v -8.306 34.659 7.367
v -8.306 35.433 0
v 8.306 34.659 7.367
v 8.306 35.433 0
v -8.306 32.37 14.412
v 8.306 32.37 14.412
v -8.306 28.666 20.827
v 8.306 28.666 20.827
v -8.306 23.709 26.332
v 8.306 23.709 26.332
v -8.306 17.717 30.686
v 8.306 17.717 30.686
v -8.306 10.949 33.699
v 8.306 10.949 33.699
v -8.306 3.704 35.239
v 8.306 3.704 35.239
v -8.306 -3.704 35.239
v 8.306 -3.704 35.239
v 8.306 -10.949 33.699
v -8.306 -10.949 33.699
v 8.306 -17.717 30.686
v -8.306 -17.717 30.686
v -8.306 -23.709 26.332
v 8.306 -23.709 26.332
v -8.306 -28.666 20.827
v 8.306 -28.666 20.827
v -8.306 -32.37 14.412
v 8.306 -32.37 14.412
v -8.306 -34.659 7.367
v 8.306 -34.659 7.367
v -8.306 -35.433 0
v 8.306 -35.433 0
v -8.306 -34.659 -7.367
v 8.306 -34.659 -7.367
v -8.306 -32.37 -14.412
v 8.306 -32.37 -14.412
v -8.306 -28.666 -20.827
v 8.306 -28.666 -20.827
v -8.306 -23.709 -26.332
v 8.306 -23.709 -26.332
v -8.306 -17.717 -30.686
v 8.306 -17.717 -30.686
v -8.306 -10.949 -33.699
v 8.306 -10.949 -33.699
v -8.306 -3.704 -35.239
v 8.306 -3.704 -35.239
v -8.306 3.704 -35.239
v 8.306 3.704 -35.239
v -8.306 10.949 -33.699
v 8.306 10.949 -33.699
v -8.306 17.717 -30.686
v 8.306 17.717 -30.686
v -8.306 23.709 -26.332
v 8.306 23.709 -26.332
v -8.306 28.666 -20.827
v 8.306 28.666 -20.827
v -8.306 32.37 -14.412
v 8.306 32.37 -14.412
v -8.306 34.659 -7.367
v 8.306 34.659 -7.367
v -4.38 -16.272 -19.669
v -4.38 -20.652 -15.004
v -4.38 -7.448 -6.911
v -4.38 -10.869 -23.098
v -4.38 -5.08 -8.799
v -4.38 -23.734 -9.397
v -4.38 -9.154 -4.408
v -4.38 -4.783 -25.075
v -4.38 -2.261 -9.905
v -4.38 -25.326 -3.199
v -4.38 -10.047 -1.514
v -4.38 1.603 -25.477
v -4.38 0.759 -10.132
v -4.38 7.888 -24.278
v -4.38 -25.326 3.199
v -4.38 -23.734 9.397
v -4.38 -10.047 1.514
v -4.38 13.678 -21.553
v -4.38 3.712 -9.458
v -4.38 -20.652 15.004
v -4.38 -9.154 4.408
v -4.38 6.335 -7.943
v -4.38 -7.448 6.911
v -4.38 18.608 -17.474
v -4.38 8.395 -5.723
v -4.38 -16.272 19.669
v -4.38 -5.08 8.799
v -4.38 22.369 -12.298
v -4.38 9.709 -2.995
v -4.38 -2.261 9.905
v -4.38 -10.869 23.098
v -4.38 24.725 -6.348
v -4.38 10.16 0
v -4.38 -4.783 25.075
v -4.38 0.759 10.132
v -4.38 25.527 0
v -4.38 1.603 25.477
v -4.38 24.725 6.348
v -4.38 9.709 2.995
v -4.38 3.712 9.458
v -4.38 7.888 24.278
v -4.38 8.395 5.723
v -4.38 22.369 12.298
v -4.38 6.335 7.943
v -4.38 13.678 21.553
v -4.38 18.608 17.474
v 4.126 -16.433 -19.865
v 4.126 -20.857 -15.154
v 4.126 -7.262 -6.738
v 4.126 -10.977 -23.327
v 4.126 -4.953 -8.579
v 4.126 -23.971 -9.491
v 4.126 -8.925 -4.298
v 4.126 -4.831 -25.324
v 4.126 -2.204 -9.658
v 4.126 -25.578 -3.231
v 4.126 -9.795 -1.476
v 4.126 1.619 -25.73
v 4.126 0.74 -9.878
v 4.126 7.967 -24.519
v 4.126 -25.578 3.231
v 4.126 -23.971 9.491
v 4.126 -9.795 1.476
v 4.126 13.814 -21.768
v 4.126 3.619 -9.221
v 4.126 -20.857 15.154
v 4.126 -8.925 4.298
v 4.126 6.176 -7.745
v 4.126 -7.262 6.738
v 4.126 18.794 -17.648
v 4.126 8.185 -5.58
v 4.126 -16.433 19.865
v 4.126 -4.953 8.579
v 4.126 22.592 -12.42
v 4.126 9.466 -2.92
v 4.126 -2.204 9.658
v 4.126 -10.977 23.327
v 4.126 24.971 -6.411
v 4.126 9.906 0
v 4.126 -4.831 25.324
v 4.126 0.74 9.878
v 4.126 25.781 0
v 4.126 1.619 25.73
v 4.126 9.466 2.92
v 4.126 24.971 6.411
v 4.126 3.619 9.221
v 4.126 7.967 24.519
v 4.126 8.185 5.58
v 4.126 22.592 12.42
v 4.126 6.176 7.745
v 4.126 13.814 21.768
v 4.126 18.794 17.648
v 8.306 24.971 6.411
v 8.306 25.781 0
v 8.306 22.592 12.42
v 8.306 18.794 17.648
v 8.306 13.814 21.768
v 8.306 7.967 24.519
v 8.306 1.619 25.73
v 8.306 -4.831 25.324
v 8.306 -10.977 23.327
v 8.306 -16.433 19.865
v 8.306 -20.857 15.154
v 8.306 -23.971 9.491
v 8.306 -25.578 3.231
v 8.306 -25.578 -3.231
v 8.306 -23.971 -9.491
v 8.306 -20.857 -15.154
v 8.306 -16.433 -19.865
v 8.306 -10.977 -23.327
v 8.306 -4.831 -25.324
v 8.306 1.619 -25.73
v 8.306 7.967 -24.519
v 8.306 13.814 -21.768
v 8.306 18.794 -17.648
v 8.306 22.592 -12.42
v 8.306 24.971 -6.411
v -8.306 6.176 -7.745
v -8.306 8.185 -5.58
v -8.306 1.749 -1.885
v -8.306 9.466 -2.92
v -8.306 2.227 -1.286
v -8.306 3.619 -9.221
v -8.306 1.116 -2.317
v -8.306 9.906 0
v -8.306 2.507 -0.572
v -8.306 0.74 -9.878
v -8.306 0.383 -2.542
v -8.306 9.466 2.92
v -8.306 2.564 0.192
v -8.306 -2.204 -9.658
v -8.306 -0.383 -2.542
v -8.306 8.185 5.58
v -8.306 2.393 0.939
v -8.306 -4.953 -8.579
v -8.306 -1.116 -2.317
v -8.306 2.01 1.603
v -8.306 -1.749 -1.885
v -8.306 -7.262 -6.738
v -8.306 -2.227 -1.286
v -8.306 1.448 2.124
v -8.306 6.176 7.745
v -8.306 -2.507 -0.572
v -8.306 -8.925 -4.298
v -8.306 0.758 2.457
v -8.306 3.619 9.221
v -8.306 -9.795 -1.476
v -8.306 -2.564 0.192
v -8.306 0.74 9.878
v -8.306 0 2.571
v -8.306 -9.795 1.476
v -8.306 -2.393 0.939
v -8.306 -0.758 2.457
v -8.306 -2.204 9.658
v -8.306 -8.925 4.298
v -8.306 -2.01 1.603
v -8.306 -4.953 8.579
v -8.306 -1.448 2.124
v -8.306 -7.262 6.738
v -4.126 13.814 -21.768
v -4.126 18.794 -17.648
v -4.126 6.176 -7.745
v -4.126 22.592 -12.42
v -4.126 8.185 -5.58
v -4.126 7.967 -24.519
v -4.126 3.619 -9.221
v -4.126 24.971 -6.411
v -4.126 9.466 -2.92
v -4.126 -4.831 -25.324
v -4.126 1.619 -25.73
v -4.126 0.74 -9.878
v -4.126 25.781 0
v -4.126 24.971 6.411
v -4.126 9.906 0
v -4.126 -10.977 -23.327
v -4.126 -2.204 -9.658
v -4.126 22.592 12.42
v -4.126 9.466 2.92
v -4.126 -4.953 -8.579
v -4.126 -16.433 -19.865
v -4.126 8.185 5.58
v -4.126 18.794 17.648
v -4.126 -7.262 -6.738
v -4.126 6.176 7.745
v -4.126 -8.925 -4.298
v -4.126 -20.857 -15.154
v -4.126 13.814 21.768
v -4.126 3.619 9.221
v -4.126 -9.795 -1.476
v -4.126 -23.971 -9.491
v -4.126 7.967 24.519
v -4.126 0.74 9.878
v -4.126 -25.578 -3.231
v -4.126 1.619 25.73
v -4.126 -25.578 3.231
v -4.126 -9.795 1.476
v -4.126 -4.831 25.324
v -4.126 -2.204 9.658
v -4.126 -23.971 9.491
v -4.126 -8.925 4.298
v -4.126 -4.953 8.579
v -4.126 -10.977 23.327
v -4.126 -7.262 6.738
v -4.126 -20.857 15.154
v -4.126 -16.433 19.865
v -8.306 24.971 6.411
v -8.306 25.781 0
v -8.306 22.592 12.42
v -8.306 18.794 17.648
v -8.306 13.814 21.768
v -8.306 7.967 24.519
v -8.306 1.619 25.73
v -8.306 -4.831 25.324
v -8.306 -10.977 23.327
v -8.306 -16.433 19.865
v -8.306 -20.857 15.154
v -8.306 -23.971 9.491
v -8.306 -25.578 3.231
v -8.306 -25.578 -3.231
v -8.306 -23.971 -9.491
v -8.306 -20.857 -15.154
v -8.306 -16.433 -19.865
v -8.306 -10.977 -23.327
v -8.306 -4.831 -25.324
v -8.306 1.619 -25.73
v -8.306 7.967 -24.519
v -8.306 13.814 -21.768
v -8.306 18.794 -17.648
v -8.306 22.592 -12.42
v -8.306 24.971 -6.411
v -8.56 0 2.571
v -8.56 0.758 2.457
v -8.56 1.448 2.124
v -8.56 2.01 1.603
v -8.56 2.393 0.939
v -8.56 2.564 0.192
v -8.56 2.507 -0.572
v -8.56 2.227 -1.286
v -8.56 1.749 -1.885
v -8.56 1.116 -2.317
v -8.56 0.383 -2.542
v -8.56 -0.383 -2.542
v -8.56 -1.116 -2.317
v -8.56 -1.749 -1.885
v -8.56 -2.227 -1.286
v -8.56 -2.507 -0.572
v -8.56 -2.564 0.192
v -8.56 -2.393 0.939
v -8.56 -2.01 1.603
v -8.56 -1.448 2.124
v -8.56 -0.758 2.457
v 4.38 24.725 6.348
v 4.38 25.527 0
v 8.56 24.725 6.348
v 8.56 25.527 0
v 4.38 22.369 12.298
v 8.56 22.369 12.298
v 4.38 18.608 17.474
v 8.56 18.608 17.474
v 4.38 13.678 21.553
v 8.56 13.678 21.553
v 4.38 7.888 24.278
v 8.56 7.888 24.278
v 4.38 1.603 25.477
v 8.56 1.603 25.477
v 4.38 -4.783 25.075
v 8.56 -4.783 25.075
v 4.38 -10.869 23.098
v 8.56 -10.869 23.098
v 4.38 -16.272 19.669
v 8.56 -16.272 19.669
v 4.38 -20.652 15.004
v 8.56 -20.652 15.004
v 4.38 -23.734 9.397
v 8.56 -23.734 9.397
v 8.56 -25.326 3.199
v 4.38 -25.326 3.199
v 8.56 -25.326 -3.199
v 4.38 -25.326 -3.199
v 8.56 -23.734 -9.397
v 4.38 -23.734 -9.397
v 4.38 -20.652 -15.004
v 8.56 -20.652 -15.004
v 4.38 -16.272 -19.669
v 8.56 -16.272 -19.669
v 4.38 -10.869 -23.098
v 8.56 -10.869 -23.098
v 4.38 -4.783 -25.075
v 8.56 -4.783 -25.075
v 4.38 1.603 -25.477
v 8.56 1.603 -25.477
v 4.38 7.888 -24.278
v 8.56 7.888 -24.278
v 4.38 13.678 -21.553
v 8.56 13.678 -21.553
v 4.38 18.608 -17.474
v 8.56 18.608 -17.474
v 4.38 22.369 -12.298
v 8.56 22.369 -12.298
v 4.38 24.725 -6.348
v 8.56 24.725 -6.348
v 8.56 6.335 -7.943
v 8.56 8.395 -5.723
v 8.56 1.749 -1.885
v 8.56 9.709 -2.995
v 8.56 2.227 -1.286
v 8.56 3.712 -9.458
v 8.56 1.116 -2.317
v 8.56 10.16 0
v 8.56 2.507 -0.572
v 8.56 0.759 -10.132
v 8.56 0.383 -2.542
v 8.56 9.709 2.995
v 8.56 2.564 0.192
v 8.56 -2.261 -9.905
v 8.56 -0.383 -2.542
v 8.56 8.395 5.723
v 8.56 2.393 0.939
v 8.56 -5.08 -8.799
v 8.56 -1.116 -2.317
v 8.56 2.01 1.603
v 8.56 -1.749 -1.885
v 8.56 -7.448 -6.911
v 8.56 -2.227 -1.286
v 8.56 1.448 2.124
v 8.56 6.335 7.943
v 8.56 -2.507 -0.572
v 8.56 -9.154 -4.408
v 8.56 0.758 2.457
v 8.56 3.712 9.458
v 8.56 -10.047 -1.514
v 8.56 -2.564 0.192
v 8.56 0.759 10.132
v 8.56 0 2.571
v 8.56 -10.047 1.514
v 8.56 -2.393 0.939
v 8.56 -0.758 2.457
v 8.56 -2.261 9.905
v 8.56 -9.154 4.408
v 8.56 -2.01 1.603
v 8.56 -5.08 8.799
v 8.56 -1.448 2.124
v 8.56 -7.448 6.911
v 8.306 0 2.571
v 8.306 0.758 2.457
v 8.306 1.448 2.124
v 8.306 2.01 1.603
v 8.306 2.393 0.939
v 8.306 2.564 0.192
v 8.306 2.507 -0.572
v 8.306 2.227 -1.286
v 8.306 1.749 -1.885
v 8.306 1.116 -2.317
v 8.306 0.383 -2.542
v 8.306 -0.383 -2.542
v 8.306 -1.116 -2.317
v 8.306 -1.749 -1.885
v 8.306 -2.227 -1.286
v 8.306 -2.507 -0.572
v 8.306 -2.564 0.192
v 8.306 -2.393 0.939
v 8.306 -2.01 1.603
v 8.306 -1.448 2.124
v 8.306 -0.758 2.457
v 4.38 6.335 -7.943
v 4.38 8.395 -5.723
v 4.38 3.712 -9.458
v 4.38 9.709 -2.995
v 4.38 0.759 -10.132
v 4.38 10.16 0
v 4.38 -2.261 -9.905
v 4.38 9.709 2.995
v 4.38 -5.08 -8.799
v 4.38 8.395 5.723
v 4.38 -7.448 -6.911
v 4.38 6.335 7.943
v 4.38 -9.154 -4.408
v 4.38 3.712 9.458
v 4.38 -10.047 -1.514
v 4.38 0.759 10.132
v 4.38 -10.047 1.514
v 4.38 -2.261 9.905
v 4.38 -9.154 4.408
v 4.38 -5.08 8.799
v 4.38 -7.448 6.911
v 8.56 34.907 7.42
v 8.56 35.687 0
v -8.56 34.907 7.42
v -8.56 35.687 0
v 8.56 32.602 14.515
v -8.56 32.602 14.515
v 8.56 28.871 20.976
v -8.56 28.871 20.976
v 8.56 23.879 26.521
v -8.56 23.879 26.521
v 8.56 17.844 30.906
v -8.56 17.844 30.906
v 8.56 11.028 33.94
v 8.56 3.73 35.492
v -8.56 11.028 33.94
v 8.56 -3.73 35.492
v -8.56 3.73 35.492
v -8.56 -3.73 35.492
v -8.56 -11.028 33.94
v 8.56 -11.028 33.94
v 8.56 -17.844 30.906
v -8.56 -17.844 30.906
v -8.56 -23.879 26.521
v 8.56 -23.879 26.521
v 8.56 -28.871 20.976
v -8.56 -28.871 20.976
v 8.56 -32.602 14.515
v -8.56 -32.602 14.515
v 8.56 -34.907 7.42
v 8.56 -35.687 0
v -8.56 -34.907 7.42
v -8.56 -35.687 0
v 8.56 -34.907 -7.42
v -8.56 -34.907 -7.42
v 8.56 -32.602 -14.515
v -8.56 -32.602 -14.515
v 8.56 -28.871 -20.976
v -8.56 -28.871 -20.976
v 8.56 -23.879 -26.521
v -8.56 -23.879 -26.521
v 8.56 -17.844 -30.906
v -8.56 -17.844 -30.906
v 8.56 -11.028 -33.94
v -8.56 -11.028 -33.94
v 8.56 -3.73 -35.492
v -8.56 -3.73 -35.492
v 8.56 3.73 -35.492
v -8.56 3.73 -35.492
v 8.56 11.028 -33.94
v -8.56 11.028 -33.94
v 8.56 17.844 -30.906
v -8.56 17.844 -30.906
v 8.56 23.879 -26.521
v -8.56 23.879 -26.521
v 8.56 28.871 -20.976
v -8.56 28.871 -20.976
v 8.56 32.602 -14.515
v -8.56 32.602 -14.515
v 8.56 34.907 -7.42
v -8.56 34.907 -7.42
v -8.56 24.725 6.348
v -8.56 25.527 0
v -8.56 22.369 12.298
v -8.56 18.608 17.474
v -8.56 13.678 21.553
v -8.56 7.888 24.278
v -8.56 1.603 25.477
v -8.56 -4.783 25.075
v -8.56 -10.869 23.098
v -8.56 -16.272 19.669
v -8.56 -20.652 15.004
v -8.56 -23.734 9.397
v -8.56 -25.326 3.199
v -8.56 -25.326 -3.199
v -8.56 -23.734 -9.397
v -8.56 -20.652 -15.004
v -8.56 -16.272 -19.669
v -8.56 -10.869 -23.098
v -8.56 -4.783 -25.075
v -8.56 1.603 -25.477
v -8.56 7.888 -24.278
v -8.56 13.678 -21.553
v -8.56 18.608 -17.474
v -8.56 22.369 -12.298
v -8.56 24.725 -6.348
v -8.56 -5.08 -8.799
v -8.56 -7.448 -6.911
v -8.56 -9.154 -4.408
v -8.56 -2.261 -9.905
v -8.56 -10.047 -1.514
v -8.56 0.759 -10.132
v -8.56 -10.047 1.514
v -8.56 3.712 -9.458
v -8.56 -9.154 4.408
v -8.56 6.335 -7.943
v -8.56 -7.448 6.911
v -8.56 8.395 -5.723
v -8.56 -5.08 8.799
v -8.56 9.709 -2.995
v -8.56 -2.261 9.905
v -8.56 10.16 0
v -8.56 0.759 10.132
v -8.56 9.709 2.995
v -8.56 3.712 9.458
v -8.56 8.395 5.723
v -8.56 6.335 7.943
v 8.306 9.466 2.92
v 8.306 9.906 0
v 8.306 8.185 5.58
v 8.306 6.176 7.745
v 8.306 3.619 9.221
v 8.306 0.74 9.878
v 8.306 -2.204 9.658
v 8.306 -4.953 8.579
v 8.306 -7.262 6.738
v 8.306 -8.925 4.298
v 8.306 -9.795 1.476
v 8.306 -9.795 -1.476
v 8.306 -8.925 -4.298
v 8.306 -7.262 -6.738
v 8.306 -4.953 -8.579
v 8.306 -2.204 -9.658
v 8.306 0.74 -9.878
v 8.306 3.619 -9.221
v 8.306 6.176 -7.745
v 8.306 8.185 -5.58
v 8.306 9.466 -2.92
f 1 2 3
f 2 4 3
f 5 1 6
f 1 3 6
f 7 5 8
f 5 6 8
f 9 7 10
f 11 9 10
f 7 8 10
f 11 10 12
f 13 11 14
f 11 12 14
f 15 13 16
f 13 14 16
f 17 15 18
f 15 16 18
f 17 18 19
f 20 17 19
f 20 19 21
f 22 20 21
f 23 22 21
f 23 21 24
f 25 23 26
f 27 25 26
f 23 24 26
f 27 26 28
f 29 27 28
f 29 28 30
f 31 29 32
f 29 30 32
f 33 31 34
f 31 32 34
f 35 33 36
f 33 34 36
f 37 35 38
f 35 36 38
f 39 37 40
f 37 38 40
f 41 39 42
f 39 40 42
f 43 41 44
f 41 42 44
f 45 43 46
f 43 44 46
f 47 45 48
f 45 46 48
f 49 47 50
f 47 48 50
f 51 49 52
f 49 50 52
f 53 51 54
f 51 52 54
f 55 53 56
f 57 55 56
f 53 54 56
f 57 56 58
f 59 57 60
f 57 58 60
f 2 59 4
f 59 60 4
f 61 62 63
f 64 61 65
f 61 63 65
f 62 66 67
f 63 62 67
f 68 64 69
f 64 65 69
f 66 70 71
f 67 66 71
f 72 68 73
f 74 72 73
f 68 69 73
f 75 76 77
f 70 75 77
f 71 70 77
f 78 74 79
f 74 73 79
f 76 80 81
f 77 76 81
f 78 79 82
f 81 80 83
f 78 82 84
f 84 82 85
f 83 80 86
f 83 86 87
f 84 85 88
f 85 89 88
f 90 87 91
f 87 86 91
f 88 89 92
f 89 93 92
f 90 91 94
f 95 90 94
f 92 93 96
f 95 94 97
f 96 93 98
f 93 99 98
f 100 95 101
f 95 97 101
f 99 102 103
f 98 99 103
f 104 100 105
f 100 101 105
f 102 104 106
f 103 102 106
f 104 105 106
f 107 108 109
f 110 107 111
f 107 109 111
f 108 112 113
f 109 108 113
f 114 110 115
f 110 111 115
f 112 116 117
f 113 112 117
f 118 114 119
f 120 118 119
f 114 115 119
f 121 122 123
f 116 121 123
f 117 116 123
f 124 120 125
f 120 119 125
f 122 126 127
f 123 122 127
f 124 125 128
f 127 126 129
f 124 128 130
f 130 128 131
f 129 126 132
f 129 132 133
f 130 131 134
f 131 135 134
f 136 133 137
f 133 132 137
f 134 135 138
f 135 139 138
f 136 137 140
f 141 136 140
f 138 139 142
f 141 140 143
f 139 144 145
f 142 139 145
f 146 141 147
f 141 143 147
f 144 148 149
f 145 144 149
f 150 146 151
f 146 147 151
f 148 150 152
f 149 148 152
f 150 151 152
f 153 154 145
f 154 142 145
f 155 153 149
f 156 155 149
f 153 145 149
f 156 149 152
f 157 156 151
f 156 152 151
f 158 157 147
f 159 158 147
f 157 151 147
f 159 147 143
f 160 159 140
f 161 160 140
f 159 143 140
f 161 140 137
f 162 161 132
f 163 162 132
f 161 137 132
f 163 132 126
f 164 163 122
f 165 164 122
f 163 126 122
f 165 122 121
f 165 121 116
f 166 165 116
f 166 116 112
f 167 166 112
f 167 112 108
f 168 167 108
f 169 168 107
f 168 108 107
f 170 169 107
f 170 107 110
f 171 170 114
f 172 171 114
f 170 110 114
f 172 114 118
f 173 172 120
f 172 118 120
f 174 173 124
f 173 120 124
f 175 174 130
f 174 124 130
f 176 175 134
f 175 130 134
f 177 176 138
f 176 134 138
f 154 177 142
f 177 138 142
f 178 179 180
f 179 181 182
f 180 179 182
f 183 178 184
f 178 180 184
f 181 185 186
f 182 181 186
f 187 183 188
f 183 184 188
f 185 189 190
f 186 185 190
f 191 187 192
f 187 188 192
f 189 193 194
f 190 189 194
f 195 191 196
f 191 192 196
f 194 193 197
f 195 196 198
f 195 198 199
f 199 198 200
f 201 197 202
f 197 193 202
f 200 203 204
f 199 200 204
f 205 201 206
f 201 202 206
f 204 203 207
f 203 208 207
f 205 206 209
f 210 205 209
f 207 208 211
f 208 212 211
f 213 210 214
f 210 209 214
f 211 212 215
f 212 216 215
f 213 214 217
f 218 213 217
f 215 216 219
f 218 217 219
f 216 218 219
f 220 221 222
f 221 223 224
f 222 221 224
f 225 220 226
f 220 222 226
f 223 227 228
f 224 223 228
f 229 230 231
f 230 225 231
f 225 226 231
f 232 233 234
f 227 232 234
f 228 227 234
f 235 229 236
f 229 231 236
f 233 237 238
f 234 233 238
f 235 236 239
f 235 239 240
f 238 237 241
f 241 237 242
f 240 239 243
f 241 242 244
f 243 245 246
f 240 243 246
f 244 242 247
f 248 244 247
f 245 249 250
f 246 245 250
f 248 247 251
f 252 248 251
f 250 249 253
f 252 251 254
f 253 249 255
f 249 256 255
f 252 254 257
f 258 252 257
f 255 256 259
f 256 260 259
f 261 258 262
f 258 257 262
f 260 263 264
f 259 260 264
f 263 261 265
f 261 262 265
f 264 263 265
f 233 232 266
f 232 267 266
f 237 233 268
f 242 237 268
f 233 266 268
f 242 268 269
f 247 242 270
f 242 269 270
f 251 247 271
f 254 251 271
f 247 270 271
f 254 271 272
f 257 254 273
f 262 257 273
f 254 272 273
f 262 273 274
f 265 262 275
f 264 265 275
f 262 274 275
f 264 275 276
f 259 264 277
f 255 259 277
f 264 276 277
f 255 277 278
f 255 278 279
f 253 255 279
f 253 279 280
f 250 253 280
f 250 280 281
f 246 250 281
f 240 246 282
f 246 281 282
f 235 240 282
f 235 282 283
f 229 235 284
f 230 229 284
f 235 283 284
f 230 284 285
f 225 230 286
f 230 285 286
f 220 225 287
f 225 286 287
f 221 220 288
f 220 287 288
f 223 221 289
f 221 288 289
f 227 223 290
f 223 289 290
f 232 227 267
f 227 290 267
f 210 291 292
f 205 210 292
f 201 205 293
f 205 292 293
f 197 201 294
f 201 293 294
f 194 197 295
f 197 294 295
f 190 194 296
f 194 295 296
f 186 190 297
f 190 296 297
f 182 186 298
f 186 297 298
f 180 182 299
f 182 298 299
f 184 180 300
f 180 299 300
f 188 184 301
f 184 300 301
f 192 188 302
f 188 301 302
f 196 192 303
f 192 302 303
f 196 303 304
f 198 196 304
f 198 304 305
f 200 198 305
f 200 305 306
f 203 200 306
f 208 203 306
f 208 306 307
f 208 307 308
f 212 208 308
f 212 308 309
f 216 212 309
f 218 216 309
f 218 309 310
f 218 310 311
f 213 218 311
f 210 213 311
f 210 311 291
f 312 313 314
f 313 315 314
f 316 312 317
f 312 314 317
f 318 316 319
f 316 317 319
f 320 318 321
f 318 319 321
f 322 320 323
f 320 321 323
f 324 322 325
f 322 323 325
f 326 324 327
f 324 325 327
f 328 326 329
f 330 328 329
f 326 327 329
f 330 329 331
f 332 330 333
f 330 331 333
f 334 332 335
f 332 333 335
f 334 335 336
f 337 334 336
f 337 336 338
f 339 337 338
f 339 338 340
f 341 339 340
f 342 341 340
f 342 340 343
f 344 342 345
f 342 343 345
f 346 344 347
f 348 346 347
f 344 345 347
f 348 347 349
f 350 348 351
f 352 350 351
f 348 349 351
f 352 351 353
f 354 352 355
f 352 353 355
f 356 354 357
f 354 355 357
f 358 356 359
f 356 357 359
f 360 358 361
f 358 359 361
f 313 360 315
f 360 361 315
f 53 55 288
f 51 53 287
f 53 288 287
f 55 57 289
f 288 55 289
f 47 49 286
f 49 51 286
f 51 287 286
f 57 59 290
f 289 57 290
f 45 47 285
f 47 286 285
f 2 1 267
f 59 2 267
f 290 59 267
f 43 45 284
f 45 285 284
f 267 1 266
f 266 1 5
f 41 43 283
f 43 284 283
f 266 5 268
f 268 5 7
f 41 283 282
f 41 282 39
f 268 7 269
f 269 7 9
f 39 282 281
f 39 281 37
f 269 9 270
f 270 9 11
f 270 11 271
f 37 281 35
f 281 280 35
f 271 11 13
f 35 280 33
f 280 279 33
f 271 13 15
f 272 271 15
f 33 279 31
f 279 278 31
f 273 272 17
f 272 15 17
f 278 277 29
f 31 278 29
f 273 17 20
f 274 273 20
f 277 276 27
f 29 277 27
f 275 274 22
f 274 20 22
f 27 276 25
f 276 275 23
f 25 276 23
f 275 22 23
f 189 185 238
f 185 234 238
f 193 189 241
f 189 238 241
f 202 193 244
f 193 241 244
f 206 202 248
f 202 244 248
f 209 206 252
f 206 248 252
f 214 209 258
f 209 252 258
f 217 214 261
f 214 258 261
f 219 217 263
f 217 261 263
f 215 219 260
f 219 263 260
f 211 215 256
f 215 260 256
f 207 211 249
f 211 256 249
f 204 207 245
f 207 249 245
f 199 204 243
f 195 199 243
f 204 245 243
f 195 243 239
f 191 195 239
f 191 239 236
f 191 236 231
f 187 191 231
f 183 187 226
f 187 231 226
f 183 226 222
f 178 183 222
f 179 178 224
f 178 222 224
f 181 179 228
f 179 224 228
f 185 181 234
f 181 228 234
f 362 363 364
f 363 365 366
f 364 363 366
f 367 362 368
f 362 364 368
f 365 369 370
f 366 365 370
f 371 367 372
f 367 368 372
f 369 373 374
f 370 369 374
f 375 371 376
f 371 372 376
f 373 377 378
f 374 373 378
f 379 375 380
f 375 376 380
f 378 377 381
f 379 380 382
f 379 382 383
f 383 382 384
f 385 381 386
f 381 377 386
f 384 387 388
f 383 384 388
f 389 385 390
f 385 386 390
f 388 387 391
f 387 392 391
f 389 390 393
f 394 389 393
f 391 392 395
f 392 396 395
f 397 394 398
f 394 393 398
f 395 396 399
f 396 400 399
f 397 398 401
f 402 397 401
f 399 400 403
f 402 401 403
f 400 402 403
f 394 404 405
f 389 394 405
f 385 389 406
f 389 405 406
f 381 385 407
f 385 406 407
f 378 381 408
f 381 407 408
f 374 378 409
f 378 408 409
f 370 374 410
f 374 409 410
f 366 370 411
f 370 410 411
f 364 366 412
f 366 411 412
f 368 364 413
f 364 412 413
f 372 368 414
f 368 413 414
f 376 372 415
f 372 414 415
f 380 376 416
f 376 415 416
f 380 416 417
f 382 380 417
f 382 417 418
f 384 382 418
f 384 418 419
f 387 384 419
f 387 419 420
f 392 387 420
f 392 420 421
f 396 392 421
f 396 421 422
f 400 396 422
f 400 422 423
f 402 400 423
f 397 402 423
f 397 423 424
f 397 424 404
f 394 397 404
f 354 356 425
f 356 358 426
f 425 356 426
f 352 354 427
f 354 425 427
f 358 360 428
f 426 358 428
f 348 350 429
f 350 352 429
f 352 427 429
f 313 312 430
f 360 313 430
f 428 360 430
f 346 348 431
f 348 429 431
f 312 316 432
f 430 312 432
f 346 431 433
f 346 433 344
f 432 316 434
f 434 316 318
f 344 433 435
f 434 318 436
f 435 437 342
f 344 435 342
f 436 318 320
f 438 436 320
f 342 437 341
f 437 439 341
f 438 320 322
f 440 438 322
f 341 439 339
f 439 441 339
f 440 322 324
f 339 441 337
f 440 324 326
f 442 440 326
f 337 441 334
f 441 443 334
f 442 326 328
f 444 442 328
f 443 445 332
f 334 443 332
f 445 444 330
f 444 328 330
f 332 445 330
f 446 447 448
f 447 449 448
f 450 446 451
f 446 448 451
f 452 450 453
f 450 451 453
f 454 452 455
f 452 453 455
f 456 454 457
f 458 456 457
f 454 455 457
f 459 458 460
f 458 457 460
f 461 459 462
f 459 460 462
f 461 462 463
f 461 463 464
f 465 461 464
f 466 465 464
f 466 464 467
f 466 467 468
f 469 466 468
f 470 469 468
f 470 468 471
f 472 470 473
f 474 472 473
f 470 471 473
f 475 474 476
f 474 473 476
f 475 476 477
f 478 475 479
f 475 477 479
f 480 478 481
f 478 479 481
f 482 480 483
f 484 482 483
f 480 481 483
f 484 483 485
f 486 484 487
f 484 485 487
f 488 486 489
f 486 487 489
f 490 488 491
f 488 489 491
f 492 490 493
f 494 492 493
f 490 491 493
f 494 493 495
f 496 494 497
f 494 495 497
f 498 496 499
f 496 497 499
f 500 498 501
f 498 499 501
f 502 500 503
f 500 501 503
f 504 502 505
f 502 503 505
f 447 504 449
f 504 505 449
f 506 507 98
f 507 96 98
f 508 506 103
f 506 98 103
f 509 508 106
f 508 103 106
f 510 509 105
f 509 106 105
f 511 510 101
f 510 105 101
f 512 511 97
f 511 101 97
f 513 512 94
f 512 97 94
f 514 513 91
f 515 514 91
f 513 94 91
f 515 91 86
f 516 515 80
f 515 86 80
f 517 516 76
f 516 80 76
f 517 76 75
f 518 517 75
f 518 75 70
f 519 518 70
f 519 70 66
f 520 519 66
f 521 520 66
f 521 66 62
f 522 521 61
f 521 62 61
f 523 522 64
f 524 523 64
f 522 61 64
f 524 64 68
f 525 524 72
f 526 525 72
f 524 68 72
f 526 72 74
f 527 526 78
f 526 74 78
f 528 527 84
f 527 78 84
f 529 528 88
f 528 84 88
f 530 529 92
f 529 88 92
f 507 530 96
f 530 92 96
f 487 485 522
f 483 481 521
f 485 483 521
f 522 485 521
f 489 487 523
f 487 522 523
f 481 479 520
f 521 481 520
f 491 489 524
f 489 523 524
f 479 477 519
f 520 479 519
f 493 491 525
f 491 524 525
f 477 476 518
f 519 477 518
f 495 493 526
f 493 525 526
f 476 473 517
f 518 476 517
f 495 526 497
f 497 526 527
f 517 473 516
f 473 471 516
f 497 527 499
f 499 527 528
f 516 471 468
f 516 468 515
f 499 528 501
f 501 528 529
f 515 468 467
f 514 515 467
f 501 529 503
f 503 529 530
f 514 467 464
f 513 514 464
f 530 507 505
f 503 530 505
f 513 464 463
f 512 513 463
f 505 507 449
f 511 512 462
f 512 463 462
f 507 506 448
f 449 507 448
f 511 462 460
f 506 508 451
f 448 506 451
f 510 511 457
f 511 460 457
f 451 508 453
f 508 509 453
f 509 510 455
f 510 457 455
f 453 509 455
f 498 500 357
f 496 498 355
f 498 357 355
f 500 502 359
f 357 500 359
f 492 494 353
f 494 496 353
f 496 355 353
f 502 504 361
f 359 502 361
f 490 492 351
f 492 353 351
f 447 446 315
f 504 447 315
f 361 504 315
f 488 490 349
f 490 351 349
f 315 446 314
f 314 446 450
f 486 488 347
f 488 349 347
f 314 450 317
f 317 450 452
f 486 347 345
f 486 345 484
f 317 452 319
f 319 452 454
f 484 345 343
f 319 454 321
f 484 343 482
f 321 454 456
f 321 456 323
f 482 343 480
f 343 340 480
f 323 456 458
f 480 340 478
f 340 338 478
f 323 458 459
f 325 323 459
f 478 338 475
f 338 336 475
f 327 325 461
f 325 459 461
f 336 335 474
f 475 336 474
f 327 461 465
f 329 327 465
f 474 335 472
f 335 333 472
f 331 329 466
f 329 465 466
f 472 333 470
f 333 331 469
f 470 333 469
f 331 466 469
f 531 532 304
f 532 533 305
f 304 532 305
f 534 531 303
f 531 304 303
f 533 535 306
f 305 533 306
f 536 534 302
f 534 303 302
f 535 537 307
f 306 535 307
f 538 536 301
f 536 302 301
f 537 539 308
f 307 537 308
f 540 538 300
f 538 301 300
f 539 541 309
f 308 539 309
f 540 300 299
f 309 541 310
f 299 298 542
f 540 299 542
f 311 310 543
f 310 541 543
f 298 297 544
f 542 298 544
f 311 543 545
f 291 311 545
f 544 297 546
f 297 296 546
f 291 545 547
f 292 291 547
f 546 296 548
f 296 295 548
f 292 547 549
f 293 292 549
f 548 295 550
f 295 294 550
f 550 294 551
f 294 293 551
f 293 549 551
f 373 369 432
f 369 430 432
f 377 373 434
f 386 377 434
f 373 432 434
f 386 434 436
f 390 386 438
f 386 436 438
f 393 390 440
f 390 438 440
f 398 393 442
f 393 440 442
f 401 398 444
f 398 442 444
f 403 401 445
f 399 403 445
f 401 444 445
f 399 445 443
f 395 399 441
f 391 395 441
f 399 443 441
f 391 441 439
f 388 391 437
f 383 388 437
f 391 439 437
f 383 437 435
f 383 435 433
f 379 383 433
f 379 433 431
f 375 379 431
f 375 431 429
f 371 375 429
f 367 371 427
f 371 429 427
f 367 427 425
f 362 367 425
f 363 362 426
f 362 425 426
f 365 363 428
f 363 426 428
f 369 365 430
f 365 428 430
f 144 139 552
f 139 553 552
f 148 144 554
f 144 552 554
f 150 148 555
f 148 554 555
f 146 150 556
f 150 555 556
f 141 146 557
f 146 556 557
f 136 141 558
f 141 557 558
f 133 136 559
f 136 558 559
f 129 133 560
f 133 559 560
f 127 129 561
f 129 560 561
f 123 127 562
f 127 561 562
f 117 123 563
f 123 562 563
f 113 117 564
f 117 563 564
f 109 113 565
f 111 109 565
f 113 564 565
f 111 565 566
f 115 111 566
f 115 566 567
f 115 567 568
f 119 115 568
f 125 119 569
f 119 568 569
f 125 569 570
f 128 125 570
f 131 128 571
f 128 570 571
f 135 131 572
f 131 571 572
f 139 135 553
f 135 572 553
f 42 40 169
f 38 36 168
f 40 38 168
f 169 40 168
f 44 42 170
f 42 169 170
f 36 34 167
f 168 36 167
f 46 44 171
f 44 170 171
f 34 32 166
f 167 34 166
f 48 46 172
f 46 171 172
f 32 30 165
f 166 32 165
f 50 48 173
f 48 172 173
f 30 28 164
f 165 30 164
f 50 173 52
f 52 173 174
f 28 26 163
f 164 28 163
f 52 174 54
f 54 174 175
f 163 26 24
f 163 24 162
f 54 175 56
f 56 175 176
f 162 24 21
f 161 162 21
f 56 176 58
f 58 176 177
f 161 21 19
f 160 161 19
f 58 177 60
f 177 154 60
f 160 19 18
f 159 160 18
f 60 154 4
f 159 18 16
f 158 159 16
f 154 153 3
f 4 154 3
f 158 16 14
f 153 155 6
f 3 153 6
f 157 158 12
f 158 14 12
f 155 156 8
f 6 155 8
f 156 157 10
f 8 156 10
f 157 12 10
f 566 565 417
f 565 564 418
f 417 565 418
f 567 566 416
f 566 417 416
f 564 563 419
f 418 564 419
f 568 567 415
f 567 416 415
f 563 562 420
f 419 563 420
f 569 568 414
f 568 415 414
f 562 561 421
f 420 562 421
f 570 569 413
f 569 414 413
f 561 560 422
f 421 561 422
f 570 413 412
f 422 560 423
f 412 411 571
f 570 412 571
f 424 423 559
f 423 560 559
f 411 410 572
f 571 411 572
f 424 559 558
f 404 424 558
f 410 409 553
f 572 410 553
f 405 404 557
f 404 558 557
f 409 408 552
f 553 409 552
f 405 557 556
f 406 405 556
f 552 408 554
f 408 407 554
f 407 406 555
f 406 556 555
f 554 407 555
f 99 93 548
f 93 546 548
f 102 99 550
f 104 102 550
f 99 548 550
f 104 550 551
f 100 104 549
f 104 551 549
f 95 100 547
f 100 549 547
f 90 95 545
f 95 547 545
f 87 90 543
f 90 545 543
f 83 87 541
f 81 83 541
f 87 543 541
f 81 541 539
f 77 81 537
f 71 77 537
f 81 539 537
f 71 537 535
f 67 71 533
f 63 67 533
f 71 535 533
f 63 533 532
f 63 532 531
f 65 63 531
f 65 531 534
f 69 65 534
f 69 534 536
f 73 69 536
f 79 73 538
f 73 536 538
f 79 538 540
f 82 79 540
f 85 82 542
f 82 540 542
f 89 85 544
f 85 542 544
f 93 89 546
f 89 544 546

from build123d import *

# Parameters (mm, degrees)
SKETCH2_R          = 2.571129816
CUT_EXTRUDE2_DEPTH = 25.4


with BuildPart() as part:
    # Sketch1 → Revolve-Thin3 (revolve)
    with BuildSketch(Plane.XY):
        Polygon((0.497679461, 0), (8.560086725, 0), (8.560086725, 10.16), (4.379579254, 10.16), (4.379579254, 25.527), (8.560086725, 25.527), (8.560086725, 35.687), (-8.560086725, 35.687), (-8.560086725, 25.527), (-4.379579254, 25.527), (-4.379579254, 10.16), (-8.560086725, 10.16), (-8.560086725, 0), (-0.497679461, 0), (-0.497679461, 0.254), (-8.306086725, 0.254), (-8.306086725, 9.906), (-4.125579254, 9.906), (-4.125579254, 25.781), (-8.306086725, 25.781), (-8.306086725, 35.433), (8.306086725, 35.433), (8.306086725, 25.781), (4.125579254, 25.781), (4.125579254, 9.906), (8.306086725, 9.906), (8.306086725, 0.254), (0.497679461, 0.254), align=None)
    revolve(axis=Axis((-8.560086725, 0, 0), (1, 0, 0)))

    # Sketch2 → Cut-Extrude2 (cut)
    with BuildSketch(Plane.ZY.offset(8.560086725)):
        Circle(SKETCH2_R)
    extrude(amount=-CUT_EXTRUDE2_DEPTH, mode=Mode.SUBTRACT)


solid = part.part
